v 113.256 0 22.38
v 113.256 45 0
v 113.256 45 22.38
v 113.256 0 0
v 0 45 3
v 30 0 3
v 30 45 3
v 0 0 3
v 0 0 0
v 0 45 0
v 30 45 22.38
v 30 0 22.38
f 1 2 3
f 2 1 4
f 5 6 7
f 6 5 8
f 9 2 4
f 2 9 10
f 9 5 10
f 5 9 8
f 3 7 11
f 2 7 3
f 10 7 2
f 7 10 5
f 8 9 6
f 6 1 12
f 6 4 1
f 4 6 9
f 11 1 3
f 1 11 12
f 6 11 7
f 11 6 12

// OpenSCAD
// =============================
// Spacer for tiles in path
// Optimized for transparent PLA Printing
// OpenSCAD 2021.01 Compatible
// =============================

$fn = 300; // smooth surface quality

//// dimensions ////
// print settings //
layer_h = 0.2; // layer height
layers = 15; // number of layers
overhang_thickness = layer_h * layers; 
// Path //
path_length = 217.5; // inches
// width = Don't remember
// Tiles //
tile_widthHeight = 23.5; // inches
tile_thickness = 0.763; // inches
tile_count = 8; // number of tiles in path
t_thick_mm = tile_thickness * 25.4; // convert to mm
tile_spacing = (path_length - (tile_count * tile_widthHeight)) / (tile_count + 1); // inches
tile_spacing_mm = tile_spacing * 25.4; // convert to mm

// spacer //
spacer_width = 45; // width of spacer
overhang = 30; // mm of overhang

// modules

module spacer() {
    // base, which will be the top that goes over each tile being spaced
    cube([tile_spacing_mm + (overhang), spacer_width, overhang_thickness]);
    // actual spacer between tiles
    translate([overhang,0,overhang_thickness]) cube([tile_spacing_mm, spacer_width, t_thick_mm]);
}

// display

spacer();
echo("tile spacing (inch): ", tile_spacing ); 
echo("tile spacing (mm): ", tile_spacing_mm);
